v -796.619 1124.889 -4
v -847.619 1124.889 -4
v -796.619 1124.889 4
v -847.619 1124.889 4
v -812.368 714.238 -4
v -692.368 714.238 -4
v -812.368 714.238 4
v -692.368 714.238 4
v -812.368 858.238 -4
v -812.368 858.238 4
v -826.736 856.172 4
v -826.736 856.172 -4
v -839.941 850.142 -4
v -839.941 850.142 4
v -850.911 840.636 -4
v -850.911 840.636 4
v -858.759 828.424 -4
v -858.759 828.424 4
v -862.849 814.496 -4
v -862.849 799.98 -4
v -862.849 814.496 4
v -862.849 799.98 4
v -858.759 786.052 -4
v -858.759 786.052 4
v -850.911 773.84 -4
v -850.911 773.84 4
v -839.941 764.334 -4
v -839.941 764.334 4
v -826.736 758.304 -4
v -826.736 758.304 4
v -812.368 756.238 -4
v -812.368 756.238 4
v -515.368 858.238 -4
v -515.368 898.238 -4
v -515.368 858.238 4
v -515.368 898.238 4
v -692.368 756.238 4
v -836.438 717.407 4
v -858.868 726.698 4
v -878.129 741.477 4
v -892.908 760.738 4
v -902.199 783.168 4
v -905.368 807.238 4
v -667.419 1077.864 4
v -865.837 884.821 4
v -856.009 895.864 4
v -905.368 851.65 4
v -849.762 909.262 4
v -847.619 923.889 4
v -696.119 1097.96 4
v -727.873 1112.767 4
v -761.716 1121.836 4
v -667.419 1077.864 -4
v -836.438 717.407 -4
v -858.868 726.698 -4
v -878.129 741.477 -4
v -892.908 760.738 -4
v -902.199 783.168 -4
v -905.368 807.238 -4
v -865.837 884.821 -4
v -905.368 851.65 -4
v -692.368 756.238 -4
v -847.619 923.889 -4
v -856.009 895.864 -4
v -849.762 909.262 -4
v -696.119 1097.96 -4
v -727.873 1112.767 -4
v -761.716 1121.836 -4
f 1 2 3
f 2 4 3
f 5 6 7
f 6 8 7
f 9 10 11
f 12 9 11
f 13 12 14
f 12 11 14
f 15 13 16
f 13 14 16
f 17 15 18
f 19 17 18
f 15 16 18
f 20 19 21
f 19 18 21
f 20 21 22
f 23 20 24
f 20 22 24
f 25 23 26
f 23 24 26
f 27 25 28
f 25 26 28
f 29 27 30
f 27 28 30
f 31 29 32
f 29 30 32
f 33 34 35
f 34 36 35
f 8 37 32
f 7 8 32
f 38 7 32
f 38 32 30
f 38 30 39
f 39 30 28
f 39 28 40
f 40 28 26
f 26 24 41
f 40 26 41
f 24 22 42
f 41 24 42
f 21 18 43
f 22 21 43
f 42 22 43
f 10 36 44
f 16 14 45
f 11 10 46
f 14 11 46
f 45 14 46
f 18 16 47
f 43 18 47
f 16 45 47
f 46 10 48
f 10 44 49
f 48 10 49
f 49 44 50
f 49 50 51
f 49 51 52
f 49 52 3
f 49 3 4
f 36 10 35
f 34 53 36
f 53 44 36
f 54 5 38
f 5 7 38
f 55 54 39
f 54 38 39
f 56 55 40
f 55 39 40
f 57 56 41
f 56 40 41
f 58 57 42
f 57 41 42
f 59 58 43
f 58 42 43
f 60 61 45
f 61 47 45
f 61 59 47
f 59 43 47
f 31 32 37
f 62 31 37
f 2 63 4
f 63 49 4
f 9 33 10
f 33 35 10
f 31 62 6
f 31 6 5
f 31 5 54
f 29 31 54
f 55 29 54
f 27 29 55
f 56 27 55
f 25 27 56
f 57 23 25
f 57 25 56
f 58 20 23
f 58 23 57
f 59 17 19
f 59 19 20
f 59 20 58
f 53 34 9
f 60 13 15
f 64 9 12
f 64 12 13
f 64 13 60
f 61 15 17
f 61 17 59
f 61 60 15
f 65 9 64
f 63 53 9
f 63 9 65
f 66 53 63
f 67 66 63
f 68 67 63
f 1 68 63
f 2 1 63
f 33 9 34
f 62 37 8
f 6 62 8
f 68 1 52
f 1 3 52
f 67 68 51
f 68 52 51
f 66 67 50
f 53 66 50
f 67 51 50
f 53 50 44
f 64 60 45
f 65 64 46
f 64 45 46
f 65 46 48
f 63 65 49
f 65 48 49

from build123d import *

# Parameters (mm, degrees)
EXTRUDE_1_DEPTH = 4


with BuildPart() as part:
    # 草图1 → 凸台-拉伸1 (new, symmetric)
    with BuildSketch(Plane.XY):
        with BuildLine():
            Line((-692.368123223, 756.238006891), (-692.368123223, 714.238006891))
            Line((-692.368123223, 714.238006891), (-812.368123223, 714.238006891))
            ThreePointArc((-812.368123223, 714.238006891), (-878.129053873, 741.477076241), (-905.368123223, 807.238006891))
            Line((-905.368123223, 807.238006891), (-905.368123223, 851.650469452))
            Line((-905.368123223, 851.650469452), (-865.837171529, 884.820876438))
            ThreePointArc((-865.837171529, 884.820876438), (-852.397642484, 902.335611688), (-847.619339623, 923.889143037))
            Line((-847.619339623, 923.889143037), (-847.619339623, 1124.889143037))
            Line((-847.619339623, 1124.889143037), (-796.619339623, 1124.889143037))
            ThreePointArc((-796.619339623, 1124.889143037), (-727.873290815, 1112.767359815), (-667.419030076, 1077.864076104))
            Line((-667.419030076, 1077.864076104), (-515.368123223, 898.238006891))
            Line((-515.368123223, 898.238006891), (-515.368123223, 858.238006891))
            Line((-515.368123223, 858.238006891), (-812.368123223, 858.238006891))
            ThreePointArc((-812.368123223, 858.238006891), (-863.368123223, 807.238006891), (-812.368123223, 756.238006891))
            Line((-812.368123223, 756.238006891), (-692.368123223, 756.238006891))
        make_face()
    extrude(amount=EXTRUDE_1_DEPTH, both=True)


solid = part.part
